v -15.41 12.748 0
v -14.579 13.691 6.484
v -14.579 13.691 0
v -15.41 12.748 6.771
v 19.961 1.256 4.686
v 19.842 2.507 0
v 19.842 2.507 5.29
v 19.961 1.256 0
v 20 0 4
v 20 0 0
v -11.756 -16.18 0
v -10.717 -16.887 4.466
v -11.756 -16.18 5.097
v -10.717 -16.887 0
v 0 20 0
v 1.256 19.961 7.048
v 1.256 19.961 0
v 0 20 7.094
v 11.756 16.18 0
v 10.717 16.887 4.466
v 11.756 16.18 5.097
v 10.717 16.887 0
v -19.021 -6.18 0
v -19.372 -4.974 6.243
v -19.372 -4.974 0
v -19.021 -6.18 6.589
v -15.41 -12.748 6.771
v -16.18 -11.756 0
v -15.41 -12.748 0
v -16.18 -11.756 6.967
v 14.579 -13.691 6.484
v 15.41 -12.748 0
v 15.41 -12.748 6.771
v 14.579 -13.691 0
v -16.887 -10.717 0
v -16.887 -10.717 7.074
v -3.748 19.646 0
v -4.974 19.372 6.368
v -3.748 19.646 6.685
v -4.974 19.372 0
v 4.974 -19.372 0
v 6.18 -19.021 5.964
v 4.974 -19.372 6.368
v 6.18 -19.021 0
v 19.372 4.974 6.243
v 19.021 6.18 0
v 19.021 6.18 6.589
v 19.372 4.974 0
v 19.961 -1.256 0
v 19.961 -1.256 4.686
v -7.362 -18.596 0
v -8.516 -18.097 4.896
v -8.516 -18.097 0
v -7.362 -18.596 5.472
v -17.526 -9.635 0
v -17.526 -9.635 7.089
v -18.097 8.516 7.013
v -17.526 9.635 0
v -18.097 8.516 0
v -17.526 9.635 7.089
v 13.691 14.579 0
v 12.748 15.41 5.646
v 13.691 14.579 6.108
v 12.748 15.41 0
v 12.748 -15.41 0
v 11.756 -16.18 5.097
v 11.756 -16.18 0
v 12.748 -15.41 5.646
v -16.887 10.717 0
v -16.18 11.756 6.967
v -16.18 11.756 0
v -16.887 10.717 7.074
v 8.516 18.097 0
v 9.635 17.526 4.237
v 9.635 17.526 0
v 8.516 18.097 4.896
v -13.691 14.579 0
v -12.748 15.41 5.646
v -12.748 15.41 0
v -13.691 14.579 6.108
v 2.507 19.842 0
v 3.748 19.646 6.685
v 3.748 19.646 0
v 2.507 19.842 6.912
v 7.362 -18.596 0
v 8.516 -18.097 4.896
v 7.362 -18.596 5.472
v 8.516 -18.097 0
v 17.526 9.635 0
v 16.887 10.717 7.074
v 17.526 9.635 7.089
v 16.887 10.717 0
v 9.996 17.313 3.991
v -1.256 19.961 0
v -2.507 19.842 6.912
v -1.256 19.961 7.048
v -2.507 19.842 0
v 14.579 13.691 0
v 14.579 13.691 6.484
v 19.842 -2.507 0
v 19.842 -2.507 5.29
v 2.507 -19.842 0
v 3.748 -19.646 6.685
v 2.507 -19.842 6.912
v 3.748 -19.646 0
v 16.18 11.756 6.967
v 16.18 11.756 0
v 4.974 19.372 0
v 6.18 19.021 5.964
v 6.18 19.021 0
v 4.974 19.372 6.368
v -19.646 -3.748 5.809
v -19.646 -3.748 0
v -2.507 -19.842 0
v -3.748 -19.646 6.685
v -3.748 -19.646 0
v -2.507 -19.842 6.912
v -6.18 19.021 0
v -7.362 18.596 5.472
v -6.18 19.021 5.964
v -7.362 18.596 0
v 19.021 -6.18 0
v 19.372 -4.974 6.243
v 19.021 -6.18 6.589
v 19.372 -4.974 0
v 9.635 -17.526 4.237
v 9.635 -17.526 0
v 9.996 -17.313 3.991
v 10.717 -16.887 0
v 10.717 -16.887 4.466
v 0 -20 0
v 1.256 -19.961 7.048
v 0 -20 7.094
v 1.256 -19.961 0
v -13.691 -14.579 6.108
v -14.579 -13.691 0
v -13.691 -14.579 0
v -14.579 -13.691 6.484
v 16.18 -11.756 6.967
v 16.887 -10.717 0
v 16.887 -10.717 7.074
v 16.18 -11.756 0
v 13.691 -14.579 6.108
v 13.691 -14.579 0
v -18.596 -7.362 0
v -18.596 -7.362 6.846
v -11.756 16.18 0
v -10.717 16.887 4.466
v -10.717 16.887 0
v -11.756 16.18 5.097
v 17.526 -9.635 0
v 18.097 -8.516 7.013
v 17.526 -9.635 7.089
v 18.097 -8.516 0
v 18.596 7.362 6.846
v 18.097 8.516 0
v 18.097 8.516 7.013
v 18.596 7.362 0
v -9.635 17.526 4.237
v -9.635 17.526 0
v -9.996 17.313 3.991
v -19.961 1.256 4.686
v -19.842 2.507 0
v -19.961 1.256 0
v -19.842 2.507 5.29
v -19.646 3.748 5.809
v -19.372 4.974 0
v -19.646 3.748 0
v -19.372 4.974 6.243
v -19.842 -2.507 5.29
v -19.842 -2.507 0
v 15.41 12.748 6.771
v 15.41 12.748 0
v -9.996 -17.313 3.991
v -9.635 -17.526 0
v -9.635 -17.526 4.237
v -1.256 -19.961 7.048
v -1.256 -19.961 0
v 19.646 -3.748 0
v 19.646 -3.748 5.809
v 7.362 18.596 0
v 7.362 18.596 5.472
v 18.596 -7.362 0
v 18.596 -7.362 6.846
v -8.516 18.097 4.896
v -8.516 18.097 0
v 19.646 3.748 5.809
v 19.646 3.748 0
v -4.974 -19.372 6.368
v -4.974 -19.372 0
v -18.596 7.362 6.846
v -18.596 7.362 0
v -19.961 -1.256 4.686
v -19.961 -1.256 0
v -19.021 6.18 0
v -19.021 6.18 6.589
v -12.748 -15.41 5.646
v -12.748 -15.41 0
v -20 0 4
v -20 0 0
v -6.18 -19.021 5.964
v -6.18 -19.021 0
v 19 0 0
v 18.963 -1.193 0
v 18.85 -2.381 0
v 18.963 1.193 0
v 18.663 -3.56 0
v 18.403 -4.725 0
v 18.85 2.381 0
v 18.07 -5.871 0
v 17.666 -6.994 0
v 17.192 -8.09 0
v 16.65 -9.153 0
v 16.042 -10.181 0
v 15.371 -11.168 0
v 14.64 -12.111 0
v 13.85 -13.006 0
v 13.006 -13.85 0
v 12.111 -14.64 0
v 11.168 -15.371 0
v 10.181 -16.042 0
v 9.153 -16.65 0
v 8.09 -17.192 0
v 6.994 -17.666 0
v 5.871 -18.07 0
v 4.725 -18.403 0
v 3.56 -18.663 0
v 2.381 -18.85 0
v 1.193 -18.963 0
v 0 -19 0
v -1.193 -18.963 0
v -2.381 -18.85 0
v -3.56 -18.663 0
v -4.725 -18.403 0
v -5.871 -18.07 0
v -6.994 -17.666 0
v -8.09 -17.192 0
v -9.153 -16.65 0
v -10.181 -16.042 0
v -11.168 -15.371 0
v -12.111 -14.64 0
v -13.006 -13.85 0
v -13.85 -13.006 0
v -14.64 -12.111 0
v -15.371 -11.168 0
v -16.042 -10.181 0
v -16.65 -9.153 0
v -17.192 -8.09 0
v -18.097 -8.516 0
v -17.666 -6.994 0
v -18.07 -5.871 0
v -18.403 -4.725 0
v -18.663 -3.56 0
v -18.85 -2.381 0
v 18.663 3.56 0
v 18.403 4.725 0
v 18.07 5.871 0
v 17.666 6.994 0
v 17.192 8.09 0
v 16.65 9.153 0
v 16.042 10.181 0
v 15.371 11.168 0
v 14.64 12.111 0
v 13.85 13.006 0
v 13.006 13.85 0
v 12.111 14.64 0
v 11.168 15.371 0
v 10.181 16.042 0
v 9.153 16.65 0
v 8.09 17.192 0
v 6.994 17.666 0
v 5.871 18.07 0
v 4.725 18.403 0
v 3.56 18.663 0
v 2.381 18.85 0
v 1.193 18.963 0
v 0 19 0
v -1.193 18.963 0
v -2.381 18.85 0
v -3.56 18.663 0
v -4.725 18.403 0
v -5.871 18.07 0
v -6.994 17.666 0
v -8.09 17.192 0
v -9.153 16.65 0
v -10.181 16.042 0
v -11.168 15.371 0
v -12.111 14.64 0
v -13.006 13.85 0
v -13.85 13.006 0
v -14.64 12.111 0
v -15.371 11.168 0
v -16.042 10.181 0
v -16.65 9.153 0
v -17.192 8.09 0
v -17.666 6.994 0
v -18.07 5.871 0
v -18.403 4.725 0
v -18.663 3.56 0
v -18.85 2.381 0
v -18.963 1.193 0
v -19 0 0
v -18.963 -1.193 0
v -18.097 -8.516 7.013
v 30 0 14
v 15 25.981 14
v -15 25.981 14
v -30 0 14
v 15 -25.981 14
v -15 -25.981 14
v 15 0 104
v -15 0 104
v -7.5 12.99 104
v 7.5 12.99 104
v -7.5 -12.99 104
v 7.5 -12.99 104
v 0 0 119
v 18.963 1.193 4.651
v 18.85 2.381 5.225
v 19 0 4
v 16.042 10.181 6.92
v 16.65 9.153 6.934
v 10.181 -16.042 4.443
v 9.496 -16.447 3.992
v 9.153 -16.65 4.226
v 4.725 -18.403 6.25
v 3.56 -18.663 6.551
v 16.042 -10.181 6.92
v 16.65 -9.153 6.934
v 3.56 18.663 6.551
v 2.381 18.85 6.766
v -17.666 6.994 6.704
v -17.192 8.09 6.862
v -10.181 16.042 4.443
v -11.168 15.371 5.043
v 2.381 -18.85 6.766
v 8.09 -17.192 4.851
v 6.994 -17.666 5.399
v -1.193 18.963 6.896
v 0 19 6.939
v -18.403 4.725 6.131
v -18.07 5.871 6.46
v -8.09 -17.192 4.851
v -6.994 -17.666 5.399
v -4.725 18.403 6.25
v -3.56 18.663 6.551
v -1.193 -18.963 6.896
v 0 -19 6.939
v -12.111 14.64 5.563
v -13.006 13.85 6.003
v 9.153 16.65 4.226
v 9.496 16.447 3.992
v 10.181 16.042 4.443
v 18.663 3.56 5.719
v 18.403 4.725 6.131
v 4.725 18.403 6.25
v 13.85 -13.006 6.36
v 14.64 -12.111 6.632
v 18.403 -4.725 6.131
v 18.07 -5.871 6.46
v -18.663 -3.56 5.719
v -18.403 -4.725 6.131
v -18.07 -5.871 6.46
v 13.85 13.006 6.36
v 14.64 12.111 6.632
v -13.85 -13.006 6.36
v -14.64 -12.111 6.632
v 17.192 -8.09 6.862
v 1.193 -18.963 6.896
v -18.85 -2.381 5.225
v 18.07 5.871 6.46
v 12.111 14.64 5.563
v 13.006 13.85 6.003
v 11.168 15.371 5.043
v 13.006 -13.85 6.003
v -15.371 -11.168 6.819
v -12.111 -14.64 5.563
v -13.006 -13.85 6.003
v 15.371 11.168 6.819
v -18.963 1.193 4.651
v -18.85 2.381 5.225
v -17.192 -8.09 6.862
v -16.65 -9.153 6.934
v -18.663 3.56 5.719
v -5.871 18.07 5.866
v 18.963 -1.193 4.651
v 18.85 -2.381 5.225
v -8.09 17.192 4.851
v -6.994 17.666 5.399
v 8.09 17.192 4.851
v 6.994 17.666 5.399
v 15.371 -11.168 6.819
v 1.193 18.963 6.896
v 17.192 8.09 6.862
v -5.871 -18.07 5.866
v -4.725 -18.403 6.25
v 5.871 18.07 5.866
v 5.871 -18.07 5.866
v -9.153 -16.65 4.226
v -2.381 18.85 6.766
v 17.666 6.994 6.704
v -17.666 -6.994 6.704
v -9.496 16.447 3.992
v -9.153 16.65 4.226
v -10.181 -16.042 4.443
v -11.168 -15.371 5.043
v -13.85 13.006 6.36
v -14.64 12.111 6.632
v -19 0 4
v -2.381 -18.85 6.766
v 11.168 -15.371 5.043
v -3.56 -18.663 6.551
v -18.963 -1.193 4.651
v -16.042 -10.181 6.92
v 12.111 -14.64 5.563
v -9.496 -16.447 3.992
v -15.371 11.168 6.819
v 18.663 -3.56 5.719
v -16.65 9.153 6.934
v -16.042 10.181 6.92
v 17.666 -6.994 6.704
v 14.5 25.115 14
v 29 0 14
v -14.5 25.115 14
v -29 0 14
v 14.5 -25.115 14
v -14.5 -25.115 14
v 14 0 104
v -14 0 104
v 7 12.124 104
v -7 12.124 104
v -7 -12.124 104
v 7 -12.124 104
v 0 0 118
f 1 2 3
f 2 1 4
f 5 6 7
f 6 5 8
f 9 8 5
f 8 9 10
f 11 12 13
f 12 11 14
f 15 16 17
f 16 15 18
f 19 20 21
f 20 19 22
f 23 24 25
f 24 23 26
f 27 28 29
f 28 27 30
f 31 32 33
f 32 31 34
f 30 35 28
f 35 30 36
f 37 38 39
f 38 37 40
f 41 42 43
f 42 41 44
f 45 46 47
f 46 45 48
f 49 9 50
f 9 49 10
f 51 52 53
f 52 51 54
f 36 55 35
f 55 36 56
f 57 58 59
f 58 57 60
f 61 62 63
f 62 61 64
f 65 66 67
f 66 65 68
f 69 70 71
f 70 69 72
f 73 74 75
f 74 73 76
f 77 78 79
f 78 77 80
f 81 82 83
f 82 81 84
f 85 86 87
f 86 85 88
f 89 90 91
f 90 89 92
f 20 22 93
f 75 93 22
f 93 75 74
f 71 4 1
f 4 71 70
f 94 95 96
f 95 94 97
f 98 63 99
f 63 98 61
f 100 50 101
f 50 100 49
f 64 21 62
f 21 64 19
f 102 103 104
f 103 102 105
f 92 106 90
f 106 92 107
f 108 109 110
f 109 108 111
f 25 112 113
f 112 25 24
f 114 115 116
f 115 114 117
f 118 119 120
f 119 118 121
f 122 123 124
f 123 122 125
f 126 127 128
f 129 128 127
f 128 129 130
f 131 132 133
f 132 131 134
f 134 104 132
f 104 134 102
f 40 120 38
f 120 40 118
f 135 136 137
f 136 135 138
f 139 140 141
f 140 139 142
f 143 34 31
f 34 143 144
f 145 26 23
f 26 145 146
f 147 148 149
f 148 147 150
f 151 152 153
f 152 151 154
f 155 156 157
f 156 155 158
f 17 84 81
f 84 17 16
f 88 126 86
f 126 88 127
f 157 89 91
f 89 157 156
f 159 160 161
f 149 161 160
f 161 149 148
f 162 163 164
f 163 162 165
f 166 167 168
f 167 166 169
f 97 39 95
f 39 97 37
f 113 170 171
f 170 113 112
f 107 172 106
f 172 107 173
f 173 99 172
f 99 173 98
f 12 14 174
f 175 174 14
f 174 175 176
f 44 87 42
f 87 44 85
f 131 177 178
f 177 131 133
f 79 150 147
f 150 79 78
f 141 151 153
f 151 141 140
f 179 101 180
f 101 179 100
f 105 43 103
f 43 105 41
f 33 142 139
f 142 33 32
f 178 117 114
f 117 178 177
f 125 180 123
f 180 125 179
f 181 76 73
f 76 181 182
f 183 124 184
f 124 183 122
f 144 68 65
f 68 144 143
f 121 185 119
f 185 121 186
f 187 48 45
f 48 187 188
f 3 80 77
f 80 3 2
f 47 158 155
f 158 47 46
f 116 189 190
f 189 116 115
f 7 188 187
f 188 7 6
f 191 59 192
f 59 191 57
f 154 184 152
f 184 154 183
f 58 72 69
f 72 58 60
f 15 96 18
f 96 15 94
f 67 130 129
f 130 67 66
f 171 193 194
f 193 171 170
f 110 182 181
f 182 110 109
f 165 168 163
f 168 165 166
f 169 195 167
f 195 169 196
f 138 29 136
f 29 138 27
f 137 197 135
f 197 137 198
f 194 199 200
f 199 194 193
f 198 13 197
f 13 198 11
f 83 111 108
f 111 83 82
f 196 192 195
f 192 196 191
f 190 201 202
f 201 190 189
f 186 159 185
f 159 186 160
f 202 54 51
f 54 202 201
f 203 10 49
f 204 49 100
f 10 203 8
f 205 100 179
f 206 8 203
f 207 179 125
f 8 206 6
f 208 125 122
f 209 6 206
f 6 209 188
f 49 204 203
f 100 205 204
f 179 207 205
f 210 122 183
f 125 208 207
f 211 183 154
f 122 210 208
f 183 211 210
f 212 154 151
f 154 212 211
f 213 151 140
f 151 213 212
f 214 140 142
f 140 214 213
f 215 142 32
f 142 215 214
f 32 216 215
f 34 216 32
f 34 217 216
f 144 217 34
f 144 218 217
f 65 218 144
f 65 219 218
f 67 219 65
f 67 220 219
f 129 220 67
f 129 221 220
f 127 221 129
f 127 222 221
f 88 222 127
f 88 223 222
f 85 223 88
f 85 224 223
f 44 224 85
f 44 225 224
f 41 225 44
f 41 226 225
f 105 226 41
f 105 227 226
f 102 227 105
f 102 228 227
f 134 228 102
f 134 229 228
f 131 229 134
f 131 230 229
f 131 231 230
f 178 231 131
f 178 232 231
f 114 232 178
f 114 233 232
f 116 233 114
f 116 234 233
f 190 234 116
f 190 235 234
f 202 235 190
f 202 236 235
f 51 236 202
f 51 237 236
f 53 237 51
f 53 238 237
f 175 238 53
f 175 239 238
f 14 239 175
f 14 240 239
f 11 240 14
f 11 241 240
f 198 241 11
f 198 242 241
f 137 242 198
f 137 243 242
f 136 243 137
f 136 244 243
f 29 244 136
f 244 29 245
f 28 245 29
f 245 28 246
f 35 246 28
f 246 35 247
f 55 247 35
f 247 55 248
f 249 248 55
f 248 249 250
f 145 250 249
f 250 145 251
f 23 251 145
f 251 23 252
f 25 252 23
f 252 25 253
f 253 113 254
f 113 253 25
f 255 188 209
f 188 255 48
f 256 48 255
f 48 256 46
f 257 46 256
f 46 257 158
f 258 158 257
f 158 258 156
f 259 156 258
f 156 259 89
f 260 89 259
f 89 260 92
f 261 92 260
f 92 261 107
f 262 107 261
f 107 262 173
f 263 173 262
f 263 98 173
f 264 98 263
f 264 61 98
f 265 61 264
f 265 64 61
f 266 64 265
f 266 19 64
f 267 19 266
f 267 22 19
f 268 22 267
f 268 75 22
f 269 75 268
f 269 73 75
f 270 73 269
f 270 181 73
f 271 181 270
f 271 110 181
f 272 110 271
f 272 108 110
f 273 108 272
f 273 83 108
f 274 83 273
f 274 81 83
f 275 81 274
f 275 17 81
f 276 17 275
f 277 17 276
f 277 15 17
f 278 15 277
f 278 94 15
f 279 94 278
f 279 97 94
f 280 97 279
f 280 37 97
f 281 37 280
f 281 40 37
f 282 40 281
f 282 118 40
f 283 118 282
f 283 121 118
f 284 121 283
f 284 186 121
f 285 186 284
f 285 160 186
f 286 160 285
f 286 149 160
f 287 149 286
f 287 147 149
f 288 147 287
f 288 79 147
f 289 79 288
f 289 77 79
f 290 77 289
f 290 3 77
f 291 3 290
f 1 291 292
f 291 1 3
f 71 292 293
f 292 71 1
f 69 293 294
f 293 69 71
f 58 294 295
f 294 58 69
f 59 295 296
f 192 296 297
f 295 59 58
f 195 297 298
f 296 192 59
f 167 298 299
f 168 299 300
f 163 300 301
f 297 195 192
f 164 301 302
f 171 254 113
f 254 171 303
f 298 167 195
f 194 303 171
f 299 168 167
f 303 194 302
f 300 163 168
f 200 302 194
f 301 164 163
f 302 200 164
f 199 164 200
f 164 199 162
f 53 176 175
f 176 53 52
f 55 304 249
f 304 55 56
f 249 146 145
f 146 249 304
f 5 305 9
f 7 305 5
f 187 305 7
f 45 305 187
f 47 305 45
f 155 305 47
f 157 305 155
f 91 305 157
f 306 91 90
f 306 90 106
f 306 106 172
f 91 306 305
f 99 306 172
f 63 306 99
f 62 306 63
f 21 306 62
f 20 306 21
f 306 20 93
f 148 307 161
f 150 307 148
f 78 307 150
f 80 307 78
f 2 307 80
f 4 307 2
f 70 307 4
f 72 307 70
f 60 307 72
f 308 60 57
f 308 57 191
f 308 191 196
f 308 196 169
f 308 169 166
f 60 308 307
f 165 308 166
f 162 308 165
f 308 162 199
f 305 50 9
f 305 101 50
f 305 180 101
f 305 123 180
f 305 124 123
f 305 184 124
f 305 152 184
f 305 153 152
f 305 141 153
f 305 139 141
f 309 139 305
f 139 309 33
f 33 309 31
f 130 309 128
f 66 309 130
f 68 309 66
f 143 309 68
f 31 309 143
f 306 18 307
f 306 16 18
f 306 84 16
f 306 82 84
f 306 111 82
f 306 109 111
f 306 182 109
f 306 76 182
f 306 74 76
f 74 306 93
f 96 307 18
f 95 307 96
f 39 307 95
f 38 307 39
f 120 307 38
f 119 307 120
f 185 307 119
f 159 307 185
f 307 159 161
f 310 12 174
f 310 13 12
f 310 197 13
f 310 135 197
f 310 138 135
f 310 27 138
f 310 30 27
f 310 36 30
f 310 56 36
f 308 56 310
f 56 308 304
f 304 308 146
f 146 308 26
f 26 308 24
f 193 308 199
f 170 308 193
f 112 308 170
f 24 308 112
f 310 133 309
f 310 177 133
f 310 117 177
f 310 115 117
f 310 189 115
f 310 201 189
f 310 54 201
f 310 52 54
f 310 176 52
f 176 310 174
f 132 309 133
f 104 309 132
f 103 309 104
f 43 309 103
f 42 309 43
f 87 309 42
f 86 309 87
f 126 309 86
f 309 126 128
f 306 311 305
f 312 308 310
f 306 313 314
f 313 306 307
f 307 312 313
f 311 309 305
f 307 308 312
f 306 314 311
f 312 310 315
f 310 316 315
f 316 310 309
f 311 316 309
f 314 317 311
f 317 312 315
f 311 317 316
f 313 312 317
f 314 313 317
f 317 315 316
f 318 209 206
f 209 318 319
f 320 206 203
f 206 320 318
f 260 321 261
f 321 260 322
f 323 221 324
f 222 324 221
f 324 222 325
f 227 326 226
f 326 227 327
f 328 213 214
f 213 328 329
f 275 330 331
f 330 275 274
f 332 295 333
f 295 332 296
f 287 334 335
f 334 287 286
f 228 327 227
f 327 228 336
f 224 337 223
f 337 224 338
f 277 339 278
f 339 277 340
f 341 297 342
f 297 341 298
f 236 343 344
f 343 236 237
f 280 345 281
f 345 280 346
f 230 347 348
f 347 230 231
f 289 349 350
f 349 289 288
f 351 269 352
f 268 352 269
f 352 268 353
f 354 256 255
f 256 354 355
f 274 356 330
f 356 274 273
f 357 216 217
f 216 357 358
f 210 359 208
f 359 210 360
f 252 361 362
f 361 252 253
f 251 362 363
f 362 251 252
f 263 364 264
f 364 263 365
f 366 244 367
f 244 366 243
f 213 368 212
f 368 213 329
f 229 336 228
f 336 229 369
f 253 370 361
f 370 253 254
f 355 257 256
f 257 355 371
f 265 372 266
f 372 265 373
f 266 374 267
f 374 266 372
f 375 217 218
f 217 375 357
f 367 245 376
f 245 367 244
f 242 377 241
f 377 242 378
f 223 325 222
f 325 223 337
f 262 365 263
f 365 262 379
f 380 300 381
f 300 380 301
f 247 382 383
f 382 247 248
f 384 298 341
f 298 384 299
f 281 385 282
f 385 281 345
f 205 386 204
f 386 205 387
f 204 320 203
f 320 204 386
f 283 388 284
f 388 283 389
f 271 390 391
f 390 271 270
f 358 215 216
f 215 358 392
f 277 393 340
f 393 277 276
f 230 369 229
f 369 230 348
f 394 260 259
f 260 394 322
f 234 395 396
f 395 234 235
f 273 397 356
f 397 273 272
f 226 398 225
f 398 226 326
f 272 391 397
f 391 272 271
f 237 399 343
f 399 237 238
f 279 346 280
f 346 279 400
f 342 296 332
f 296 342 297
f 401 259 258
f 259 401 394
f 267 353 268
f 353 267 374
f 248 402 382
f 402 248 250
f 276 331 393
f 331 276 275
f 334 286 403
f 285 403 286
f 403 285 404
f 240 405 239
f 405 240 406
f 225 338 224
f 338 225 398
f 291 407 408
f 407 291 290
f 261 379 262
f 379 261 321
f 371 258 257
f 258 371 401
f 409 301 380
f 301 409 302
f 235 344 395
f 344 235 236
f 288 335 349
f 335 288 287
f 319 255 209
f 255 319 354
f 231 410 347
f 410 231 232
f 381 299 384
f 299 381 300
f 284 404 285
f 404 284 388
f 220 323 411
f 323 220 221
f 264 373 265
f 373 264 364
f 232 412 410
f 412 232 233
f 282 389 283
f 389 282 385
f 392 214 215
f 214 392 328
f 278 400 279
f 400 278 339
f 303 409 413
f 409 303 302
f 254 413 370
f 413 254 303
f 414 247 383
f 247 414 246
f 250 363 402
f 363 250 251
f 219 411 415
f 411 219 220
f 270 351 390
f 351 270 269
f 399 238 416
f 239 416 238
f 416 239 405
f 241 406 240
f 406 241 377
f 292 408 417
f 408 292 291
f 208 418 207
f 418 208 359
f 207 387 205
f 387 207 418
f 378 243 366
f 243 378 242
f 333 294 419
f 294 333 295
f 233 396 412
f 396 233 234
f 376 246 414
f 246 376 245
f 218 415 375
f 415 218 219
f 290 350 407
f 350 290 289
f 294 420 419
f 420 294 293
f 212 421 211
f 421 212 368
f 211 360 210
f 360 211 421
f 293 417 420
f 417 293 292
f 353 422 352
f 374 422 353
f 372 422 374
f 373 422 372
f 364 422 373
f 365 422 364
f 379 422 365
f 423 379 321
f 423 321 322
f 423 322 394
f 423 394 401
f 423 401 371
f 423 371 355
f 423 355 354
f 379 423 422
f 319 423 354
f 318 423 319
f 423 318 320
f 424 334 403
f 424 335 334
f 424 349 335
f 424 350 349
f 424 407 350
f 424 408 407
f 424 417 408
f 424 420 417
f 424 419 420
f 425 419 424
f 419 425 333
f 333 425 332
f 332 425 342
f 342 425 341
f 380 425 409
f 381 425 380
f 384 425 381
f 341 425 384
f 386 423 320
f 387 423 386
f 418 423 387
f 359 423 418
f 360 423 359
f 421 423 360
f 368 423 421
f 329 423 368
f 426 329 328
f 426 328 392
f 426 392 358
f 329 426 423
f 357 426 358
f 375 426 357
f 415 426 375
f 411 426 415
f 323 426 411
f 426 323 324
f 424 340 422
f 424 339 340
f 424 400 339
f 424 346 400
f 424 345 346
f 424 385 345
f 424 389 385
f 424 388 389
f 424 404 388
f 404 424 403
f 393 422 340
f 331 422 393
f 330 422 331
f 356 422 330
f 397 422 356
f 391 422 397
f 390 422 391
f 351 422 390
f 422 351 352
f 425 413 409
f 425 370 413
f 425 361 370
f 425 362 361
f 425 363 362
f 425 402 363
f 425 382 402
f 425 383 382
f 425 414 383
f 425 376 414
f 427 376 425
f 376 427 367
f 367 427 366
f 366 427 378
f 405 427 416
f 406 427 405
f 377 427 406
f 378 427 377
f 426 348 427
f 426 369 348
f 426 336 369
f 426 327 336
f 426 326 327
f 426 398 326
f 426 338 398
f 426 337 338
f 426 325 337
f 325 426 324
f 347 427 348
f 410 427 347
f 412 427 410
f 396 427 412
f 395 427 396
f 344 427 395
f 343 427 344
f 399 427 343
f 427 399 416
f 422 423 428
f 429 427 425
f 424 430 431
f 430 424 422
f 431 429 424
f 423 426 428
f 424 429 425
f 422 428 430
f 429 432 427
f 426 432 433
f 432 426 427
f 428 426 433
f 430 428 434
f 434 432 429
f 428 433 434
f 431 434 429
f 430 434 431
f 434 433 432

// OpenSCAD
//Lamp cap obelisk quartz crystal.
//You can adjust the five variables below
base=40;      //Diameter of base for lamp
rim=4;            //Length of rim at base
size=60;        //Diameter of crystal
scaling=1.5;  //Scale of crystal length (default 1.5)
facets=6;       //number of faces (default 6)
//Don't change variables below here
halfsize=size/2;
upper=halfsize-(base/2)+rim;
$fn=facets;
difference(){
union(){
//outer body
translate([0,0,0])
cylinder(h=4+rim,d1=base,d2=base,$fn=100);
translate([0,0,-(base/2)+rim])
cylinder(h=halfsize,d1=0,d2=size);
translate([0,0,upper])
cylinder(h=size*scaling,d1=size,d2=size/2);
translate([0,0,upper+size*scaling])
cylinder(h=size/4,d1=size/2,d2=0);
}
//Inner core.
translate([0,0,-1])
cylinder(h=6+rim,d1=base-2,d2=base-2,$fn=100);
translate([0,0,-(base/2)+rim+1])
cylinder(h=halfsize-1,d1=0,d2=size-2);
translate([0,0,upper])
cylinder(h=size*scaling,d1=size-2,d2=(size/2)-2);
translate([0,0,upper+size*scaling])
cylinder(h=(size/4)-1,d1=(size/2)-2,d2=0);
translate([-halfsize,-halfsize,-halfsize])
cube([size,size,halfsize]);
//x-ray box
//translate([-80,-80,-50])
//cube([160,80,280]);
}
